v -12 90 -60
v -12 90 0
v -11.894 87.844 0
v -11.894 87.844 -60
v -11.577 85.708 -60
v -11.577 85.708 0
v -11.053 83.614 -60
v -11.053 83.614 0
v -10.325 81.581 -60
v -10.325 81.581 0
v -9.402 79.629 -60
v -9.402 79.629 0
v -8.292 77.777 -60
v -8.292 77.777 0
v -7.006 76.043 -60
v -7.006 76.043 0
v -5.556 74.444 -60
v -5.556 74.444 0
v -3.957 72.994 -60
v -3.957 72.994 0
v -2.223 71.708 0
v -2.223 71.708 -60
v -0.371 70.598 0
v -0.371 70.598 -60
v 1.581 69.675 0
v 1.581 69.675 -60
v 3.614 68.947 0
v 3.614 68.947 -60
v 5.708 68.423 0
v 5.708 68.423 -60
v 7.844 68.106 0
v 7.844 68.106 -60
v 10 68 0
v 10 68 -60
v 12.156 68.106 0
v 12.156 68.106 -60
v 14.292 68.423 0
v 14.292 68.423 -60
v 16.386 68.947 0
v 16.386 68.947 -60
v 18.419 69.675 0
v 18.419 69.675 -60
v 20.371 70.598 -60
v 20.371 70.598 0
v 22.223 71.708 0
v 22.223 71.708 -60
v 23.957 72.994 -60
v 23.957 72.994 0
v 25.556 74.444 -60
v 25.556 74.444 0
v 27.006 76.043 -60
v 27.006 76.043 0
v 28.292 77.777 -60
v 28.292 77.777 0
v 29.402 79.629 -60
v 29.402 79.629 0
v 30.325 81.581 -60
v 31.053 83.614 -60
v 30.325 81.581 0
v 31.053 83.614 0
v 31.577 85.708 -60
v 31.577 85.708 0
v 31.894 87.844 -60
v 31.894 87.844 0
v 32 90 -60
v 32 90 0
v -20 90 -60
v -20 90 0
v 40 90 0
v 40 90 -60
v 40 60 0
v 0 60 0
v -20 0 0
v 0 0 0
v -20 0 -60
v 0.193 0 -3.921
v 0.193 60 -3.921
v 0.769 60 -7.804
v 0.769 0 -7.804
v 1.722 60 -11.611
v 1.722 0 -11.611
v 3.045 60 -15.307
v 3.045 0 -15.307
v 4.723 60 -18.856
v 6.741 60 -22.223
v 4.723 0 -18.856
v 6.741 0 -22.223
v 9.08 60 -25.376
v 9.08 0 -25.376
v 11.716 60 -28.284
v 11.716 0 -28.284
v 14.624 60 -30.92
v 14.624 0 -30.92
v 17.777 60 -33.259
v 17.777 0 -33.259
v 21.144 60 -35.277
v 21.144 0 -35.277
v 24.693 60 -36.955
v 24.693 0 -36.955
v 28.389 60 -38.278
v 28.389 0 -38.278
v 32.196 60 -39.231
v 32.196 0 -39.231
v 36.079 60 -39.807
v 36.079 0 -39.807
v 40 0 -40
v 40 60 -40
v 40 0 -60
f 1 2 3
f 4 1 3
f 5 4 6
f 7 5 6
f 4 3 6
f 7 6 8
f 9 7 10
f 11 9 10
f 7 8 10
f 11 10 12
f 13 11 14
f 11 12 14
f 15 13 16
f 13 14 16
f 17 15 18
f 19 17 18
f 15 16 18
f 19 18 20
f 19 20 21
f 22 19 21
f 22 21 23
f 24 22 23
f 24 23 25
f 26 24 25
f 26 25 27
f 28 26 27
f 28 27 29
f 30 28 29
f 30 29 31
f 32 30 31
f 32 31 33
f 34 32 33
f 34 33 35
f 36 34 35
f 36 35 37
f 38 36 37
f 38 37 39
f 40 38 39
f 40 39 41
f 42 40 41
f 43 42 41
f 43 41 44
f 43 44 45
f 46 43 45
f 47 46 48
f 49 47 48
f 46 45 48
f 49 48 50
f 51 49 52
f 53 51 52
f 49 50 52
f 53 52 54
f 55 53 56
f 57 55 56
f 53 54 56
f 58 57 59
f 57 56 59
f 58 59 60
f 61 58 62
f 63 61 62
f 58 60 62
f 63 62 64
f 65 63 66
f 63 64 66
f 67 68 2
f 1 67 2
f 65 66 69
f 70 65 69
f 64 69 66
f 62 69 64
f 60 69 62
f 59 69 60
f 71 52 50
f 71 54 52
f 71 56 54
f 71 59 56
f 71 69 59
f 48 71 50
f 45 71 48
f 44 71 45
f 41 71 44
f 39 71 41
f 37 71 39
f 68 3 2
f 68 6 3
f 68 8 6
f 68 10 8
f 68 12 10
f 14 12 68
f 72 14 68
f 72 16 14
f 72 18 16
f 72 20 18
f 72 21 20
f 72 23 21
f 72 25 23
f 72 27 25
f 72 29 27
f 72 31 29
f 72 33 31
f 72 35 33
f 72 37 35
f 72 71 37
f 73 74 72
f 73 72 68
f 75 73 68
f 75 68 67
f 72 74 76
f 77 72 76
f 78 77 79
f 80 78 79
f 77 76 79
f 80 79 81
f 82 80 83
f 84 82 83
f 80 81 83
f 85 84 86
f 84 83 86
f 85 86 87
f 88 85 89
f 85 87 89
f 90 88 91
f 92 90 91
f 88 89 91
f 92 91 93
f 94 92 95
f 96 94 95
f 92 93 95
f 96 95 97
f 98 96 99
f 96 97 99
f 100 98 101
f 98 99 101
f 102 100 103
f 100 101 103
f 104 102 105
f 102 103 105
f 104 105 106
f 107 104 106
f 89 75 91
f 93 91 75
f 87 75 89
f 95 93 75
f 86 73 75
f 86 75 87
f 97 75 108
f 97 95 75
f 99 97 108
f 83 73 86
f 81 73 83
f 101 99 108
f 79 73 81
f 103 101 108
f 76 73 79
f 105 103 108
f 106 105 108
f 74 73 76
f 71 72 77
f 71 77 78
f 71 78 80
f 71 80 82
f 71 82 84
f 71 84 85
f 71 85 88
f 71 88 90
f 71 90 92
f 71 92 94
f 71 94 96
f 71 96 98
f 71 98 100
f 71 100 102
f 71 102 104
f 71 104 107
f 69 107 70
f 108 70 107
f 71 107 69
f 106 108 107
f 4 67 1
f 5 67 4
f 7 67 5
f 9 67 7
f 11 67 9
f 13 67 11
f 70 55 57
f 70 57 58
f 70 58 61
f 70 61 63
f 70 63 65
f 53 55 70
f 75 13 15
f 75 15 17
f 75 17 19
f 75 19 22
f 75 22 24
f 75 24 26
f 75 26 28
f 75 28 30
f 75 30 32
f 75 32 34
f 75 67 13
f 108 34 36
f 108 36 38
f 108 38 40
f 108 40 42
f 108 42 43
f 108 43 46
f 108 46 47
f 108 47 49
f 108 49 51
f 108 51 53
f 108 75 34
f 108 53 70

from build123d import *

# Parameters (mm, degrees)
F1_DEPTH = 90
F2_DEPTH = 60
F4_DEPTH = 60.001


with BuildPart() as f1:
    # F0 (on Front) → F1 (new body)
    with BuildSketch(Plane.XZ):
        with BuildLine():
            Line((0, 0), (-20, 0))
            Line((-20, 0), (-20, -60))
            Line((-20, -60), (40, -60))
            Line((40, -60), (40, -40))
            ThreePointArc((40, -40), (11.715729, -28.284271), (0, 0))
        make_face()
        with BuildLine():
            Line((40, 0), (0, 0))
            ThreePointArc((0, 0), (11.715729, -28.284271), (40, -40))
            Line((40, -40), (40, 0))
        make_face()
    extrude(amount=-F1_DEPTH)

    # F0 (on Front) → F2 (cut)
    with BuildSketch(Plane.XZ):
        with BuildLine():
            Line((40, 0), (0, 0))
            ThreePointArc((0, 0), (11.715729, -28.284271), (40, -40))
            Line((40, -40), (40, 0))
        make_face()
    extrude(amount=-F2_DEPTH, mode=Mode.SUBTRACT)

    # F3 (on face) → F4 (cut, through all)
    with BuildSketch(Plane.XY):
        with BuildLine():
            Line((32, 90), (-12, 90))
            ThreePointArc((-12, 90), (10, 68), (32, 90))
        make_face()
    extrude(amount=-F4_DEPTH, mode=Mode.SUBTRACT)


solid = f1.part
